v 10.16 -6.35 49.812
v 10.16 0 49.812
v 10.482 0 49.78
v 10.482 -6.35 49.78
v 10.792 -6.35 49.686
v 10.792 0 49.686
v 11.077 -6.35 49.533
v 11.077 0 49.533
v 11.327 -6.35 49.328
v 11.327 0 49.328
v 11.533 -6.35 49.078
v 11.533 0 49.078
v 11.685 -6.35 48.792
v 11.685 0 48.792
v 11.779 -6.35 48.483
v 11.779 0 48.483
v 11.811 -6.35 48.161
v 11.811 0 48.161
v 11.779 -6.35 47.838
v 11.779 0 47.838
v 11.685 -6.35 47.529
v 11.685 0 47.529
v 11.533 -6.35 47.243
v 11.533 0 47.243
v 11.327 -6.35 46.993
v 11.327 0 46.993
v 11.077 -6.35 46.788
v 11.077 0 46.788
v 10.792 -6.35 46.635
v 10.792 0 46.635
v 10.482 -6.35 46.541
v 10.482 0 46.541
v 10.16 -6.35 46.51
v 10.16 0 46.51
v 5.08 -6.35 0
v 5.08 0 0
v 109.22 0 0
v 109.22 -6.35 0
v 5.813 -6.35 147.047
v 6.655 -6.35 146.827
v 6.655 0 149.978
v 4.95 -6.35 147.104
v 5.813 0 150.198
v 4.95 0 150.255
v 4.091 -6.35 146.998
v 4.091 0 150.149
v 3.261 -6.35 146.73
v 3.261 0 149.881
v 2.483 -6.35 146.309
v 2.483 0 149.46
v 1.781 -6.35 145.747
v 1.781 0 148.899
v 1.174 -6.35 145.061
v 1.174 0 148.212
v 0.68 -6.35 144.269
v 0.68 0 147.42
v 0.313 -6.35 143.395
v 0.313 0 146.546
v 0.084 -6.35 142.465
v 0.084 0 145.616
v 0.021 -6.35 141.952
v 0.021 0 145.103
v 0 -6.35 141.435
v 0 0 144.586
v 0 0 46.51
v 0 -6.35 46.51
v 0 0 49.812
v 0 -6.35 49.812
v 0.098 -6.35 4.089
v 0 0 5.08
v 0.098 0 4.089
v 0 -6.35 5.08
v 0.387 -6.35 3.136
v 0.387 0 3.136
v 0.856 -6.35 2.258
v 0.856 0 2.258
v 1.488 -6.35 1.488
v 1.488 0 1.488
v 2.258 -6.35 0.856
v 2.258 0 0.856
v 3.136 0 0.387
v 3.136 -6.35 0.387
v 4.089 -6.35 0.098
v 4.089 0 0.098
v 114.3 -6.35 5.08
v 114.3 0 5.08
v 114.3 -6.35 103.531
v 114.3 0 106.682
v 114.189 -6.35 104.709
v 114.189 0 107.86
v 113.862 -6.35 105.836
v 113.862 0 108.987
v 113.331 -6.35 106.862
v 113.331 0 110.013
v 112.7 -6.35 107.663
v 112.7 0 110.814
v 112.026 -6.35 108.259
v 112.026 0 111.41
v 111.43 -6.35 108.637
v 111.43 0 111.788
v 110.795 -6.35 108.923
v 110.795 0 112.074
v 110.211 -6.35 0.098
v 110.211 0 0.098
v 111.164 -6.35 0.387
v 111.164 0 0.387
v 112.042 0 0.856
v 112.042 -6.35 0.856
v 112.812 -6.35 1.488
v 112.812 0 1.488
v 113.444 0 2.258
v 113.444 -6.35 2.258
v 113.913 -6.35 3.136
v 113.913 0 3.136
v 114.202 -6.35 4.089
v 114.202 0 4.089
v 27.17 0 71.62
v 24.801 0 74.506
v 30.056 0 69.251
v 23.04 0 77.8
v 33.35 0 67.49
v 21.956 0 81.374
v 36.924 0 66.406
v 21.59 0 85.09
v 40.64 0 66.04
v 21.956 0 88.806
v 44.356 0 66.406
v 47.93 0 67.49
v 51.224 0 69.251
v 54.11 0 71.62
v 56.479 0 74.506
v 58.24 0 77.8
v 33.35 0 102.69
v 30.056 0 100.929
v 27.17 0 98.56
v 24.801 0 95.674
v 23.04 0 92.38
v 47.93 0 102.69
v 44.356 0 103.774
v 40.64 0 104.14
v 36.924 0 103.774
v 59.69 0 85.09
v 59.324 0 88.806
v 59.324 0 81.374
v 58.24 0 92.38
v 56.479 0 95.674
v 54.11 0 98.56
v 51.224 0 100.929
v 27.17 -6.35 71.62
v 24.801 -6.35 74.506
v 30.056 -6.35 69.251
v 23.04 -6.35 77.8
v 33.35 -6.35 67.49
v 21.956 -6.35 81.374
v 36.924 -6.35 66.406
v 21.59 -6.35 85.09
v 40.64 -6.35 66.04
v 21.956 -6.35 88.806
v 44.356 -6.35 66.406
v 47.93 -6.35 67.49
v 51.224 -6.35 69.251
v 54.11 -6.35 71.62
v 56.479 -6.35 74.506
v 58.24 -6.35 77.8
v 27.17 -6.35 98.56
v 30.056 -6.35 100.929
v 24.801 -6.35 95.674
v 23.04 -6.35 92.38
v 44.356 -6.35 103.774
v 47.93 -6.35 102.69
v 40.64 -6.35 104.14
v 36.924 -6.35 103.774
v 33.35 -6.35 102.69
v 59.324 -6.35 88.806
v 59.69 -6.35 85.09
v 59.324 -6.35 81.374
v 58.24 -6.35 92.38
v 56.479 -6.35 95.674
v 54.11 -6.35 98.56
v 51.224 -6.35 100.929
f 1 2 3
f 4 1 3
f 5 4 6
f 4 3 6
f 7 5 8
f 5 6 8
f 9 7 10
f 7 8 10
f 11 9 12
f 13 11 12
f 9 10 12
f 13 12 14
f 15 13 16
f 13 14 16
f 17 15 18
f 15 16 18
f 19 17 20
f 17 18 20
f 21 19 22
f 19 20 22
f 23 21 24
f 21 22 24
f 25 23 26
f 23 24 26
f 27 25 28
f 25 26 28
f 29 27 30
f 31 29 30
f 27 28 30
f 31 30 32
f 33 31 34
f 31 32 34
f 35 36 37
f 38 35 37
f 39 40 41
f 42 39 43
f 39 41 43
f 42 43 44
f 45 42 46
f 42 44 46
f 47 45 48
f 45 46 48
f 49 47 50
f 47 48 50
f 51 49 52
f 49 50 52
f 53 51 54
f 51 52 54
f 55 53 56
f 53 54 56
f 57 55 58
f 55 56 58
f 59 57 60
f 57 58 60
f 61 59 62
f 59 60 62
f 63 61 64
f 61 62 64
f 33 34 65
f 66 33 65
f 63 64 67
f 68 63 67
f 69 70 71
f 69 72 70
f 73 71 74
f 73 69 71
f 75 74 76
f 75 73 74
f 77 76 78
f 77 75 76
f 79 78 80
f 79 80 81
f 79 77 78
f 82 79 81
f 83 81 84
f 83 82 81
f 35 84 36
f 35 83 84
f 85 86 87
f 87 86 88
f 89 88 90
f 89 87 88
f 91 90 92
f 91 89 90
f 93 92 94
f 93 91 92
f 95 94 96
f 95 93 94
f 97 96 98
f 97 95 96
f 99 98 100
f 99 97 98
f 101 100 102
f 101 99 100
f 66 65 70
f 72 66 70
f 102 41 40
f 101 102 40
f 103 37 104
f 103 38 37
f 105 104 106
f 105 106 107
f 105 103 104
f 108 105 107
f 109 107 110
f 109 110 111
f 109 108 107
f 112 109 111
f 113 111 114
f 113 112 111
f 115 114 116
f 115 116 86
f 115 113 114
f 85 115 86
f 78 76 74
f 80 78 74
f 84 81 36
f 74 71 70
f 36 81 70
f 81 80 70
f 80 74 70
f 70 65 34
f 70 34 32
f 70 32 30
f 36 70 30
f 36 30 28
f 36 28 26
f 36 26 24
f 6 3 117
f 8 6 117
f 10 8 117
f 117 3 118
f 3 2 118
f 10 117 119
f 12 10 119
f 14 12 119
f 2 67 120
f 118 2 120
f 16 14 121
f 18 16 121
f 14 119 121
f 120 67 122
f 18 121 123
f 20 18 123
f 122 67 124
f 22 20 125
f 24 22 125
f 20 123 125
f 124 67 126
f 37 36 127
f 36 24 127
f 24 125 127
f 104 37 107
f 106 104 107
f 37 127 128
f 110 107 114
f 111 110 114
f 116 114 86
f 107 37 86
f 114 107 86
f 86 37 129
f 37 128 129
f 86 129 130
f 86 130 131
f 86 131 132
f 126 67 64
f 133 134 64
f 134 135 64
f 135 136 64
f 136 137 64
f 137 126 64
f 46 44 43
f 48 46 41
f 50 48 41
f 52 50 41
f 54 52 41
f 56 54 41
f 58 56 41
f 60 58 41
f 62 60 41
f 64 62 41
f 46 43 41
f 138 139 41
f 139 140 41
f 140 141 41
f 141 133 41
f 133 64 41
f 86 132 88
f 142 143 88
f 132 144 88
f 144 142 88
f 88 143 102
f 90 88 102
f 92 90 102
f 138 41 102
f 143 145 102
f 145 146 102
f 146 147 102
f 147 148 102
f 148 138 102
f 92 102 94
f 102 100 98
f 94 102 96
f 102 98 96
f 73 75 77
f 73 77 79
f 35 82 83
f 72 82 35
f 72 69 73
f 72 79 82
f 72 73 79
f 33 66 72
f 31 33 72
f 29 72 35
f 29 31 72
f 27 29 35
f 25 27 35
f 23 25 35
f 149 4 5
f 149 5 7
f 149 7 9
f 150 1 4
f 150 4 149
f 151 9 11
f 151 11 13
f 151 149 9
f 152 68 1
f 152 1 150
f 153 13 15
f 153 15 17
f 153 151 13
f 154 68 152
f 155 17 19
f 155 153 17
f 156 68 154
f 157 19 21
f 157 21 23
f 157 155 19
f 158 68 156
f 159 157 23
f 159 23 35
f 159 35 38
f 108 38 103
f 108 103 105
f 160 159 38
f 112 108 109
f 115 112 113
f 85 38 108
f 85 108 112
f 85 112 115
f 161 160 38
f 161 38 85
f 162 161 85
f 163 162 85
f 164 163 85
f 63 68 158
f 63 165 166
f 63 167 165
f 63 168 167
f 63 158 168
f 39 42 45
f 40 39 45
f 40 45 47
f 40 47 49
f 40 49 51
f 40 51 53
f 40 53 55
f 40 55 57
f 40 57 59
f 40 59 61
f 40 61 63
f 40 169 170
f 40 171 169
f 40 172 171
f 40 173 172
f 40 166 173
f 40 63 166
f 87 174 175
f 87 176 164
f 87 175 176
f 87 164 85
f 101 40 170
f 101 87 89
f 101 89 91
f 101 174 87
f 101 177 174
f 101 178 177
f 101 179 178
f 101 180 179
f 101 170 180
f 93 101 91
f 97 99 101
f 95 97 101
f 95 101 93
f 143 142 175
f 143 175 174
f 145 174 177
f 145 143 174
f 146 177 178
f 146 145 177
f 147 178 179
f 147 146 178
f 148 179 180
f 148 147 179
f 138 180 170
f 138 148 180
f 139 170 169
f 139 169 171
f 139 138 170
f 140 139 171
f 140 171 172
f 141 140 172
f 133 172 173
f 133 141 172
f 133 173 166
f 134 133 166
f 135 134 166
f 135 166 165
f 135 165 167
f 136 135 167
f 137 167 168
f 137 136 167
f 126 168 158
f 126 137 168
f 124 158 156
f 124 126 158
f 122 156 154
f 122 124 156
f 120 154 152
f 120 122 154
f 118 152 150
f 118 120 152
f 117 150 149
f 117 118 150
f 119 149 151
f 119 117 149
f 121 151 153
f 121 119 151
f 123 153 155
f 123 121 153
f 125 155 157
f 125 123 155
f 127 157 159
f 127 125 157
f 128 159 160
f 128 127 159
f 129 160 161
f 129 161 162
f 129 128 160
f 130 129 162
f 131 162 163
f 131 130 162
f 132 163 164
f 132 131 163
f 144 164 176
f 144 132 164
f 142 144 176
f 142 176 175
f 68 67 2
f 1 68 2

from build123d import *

# Parameters (mm, degrees)
F0_R     = 19.05
F1_DEPTH = 6.35
F4_DEPTH = 159.5317363987
F5_R     = 5.08


with BuildPart() as f1:
    # F0 (on Front) → F1 (new body)
    with BuildSketch(Plane.XZ):
        with BuildLine():
            Line((0, 46.5095229447), (0, 0))
            Line((0, 0), (114.3, 0))
            Line((114.3, 0), (114.3, 110.7982022234))
            Line((114.3, 110.7982022234), (0, 152.4))
            Line((0, 152.4), (0, 49.8115229447))
            Line((0, 49.8115229447), (10.16, 49.8115229447))
            ThreePointArc((10.16, 49.8115229447), (11.811, 48.1605229447), (10.16, 46.5095229447))
            Line((10.16, 46.5095229447), (0, 46.5095229447))
        make_face()
        with Locations((40.64, 85.09)):
            Circle(F0_R, mode=Mode.SUBTRACT)
    extrude(amount=F1_DEPTH)

    # F3 (on face) → F4 (cut, through all)
    with BuildSketch(Plane(origin=(-48.9804158581, 0, 17.8274134343), x_dir=(0, -1, 0), z_dir=(-0.9396926208, 0, 0.3420201433))):
        Polygon((6.35, 143.2091554078), (0, 143.2091554078), (6.35, 140.2481017785), align=None)
    extrude(amount=-F4_DEPTH, mode=Mode.SUBTRACT)

    # F5
    f5_edges = [f1.edges().sort_by_distance(p)[0] for p in [
        (0, -3.175, 150.824456),
        (114.3, -3.175, 109.222658),
        (114.3, -3.175, 0),
        (0, -3.175, 0),
    ]]
    fillet(f5_edges, radius=F5_R)


solid = f1.part
